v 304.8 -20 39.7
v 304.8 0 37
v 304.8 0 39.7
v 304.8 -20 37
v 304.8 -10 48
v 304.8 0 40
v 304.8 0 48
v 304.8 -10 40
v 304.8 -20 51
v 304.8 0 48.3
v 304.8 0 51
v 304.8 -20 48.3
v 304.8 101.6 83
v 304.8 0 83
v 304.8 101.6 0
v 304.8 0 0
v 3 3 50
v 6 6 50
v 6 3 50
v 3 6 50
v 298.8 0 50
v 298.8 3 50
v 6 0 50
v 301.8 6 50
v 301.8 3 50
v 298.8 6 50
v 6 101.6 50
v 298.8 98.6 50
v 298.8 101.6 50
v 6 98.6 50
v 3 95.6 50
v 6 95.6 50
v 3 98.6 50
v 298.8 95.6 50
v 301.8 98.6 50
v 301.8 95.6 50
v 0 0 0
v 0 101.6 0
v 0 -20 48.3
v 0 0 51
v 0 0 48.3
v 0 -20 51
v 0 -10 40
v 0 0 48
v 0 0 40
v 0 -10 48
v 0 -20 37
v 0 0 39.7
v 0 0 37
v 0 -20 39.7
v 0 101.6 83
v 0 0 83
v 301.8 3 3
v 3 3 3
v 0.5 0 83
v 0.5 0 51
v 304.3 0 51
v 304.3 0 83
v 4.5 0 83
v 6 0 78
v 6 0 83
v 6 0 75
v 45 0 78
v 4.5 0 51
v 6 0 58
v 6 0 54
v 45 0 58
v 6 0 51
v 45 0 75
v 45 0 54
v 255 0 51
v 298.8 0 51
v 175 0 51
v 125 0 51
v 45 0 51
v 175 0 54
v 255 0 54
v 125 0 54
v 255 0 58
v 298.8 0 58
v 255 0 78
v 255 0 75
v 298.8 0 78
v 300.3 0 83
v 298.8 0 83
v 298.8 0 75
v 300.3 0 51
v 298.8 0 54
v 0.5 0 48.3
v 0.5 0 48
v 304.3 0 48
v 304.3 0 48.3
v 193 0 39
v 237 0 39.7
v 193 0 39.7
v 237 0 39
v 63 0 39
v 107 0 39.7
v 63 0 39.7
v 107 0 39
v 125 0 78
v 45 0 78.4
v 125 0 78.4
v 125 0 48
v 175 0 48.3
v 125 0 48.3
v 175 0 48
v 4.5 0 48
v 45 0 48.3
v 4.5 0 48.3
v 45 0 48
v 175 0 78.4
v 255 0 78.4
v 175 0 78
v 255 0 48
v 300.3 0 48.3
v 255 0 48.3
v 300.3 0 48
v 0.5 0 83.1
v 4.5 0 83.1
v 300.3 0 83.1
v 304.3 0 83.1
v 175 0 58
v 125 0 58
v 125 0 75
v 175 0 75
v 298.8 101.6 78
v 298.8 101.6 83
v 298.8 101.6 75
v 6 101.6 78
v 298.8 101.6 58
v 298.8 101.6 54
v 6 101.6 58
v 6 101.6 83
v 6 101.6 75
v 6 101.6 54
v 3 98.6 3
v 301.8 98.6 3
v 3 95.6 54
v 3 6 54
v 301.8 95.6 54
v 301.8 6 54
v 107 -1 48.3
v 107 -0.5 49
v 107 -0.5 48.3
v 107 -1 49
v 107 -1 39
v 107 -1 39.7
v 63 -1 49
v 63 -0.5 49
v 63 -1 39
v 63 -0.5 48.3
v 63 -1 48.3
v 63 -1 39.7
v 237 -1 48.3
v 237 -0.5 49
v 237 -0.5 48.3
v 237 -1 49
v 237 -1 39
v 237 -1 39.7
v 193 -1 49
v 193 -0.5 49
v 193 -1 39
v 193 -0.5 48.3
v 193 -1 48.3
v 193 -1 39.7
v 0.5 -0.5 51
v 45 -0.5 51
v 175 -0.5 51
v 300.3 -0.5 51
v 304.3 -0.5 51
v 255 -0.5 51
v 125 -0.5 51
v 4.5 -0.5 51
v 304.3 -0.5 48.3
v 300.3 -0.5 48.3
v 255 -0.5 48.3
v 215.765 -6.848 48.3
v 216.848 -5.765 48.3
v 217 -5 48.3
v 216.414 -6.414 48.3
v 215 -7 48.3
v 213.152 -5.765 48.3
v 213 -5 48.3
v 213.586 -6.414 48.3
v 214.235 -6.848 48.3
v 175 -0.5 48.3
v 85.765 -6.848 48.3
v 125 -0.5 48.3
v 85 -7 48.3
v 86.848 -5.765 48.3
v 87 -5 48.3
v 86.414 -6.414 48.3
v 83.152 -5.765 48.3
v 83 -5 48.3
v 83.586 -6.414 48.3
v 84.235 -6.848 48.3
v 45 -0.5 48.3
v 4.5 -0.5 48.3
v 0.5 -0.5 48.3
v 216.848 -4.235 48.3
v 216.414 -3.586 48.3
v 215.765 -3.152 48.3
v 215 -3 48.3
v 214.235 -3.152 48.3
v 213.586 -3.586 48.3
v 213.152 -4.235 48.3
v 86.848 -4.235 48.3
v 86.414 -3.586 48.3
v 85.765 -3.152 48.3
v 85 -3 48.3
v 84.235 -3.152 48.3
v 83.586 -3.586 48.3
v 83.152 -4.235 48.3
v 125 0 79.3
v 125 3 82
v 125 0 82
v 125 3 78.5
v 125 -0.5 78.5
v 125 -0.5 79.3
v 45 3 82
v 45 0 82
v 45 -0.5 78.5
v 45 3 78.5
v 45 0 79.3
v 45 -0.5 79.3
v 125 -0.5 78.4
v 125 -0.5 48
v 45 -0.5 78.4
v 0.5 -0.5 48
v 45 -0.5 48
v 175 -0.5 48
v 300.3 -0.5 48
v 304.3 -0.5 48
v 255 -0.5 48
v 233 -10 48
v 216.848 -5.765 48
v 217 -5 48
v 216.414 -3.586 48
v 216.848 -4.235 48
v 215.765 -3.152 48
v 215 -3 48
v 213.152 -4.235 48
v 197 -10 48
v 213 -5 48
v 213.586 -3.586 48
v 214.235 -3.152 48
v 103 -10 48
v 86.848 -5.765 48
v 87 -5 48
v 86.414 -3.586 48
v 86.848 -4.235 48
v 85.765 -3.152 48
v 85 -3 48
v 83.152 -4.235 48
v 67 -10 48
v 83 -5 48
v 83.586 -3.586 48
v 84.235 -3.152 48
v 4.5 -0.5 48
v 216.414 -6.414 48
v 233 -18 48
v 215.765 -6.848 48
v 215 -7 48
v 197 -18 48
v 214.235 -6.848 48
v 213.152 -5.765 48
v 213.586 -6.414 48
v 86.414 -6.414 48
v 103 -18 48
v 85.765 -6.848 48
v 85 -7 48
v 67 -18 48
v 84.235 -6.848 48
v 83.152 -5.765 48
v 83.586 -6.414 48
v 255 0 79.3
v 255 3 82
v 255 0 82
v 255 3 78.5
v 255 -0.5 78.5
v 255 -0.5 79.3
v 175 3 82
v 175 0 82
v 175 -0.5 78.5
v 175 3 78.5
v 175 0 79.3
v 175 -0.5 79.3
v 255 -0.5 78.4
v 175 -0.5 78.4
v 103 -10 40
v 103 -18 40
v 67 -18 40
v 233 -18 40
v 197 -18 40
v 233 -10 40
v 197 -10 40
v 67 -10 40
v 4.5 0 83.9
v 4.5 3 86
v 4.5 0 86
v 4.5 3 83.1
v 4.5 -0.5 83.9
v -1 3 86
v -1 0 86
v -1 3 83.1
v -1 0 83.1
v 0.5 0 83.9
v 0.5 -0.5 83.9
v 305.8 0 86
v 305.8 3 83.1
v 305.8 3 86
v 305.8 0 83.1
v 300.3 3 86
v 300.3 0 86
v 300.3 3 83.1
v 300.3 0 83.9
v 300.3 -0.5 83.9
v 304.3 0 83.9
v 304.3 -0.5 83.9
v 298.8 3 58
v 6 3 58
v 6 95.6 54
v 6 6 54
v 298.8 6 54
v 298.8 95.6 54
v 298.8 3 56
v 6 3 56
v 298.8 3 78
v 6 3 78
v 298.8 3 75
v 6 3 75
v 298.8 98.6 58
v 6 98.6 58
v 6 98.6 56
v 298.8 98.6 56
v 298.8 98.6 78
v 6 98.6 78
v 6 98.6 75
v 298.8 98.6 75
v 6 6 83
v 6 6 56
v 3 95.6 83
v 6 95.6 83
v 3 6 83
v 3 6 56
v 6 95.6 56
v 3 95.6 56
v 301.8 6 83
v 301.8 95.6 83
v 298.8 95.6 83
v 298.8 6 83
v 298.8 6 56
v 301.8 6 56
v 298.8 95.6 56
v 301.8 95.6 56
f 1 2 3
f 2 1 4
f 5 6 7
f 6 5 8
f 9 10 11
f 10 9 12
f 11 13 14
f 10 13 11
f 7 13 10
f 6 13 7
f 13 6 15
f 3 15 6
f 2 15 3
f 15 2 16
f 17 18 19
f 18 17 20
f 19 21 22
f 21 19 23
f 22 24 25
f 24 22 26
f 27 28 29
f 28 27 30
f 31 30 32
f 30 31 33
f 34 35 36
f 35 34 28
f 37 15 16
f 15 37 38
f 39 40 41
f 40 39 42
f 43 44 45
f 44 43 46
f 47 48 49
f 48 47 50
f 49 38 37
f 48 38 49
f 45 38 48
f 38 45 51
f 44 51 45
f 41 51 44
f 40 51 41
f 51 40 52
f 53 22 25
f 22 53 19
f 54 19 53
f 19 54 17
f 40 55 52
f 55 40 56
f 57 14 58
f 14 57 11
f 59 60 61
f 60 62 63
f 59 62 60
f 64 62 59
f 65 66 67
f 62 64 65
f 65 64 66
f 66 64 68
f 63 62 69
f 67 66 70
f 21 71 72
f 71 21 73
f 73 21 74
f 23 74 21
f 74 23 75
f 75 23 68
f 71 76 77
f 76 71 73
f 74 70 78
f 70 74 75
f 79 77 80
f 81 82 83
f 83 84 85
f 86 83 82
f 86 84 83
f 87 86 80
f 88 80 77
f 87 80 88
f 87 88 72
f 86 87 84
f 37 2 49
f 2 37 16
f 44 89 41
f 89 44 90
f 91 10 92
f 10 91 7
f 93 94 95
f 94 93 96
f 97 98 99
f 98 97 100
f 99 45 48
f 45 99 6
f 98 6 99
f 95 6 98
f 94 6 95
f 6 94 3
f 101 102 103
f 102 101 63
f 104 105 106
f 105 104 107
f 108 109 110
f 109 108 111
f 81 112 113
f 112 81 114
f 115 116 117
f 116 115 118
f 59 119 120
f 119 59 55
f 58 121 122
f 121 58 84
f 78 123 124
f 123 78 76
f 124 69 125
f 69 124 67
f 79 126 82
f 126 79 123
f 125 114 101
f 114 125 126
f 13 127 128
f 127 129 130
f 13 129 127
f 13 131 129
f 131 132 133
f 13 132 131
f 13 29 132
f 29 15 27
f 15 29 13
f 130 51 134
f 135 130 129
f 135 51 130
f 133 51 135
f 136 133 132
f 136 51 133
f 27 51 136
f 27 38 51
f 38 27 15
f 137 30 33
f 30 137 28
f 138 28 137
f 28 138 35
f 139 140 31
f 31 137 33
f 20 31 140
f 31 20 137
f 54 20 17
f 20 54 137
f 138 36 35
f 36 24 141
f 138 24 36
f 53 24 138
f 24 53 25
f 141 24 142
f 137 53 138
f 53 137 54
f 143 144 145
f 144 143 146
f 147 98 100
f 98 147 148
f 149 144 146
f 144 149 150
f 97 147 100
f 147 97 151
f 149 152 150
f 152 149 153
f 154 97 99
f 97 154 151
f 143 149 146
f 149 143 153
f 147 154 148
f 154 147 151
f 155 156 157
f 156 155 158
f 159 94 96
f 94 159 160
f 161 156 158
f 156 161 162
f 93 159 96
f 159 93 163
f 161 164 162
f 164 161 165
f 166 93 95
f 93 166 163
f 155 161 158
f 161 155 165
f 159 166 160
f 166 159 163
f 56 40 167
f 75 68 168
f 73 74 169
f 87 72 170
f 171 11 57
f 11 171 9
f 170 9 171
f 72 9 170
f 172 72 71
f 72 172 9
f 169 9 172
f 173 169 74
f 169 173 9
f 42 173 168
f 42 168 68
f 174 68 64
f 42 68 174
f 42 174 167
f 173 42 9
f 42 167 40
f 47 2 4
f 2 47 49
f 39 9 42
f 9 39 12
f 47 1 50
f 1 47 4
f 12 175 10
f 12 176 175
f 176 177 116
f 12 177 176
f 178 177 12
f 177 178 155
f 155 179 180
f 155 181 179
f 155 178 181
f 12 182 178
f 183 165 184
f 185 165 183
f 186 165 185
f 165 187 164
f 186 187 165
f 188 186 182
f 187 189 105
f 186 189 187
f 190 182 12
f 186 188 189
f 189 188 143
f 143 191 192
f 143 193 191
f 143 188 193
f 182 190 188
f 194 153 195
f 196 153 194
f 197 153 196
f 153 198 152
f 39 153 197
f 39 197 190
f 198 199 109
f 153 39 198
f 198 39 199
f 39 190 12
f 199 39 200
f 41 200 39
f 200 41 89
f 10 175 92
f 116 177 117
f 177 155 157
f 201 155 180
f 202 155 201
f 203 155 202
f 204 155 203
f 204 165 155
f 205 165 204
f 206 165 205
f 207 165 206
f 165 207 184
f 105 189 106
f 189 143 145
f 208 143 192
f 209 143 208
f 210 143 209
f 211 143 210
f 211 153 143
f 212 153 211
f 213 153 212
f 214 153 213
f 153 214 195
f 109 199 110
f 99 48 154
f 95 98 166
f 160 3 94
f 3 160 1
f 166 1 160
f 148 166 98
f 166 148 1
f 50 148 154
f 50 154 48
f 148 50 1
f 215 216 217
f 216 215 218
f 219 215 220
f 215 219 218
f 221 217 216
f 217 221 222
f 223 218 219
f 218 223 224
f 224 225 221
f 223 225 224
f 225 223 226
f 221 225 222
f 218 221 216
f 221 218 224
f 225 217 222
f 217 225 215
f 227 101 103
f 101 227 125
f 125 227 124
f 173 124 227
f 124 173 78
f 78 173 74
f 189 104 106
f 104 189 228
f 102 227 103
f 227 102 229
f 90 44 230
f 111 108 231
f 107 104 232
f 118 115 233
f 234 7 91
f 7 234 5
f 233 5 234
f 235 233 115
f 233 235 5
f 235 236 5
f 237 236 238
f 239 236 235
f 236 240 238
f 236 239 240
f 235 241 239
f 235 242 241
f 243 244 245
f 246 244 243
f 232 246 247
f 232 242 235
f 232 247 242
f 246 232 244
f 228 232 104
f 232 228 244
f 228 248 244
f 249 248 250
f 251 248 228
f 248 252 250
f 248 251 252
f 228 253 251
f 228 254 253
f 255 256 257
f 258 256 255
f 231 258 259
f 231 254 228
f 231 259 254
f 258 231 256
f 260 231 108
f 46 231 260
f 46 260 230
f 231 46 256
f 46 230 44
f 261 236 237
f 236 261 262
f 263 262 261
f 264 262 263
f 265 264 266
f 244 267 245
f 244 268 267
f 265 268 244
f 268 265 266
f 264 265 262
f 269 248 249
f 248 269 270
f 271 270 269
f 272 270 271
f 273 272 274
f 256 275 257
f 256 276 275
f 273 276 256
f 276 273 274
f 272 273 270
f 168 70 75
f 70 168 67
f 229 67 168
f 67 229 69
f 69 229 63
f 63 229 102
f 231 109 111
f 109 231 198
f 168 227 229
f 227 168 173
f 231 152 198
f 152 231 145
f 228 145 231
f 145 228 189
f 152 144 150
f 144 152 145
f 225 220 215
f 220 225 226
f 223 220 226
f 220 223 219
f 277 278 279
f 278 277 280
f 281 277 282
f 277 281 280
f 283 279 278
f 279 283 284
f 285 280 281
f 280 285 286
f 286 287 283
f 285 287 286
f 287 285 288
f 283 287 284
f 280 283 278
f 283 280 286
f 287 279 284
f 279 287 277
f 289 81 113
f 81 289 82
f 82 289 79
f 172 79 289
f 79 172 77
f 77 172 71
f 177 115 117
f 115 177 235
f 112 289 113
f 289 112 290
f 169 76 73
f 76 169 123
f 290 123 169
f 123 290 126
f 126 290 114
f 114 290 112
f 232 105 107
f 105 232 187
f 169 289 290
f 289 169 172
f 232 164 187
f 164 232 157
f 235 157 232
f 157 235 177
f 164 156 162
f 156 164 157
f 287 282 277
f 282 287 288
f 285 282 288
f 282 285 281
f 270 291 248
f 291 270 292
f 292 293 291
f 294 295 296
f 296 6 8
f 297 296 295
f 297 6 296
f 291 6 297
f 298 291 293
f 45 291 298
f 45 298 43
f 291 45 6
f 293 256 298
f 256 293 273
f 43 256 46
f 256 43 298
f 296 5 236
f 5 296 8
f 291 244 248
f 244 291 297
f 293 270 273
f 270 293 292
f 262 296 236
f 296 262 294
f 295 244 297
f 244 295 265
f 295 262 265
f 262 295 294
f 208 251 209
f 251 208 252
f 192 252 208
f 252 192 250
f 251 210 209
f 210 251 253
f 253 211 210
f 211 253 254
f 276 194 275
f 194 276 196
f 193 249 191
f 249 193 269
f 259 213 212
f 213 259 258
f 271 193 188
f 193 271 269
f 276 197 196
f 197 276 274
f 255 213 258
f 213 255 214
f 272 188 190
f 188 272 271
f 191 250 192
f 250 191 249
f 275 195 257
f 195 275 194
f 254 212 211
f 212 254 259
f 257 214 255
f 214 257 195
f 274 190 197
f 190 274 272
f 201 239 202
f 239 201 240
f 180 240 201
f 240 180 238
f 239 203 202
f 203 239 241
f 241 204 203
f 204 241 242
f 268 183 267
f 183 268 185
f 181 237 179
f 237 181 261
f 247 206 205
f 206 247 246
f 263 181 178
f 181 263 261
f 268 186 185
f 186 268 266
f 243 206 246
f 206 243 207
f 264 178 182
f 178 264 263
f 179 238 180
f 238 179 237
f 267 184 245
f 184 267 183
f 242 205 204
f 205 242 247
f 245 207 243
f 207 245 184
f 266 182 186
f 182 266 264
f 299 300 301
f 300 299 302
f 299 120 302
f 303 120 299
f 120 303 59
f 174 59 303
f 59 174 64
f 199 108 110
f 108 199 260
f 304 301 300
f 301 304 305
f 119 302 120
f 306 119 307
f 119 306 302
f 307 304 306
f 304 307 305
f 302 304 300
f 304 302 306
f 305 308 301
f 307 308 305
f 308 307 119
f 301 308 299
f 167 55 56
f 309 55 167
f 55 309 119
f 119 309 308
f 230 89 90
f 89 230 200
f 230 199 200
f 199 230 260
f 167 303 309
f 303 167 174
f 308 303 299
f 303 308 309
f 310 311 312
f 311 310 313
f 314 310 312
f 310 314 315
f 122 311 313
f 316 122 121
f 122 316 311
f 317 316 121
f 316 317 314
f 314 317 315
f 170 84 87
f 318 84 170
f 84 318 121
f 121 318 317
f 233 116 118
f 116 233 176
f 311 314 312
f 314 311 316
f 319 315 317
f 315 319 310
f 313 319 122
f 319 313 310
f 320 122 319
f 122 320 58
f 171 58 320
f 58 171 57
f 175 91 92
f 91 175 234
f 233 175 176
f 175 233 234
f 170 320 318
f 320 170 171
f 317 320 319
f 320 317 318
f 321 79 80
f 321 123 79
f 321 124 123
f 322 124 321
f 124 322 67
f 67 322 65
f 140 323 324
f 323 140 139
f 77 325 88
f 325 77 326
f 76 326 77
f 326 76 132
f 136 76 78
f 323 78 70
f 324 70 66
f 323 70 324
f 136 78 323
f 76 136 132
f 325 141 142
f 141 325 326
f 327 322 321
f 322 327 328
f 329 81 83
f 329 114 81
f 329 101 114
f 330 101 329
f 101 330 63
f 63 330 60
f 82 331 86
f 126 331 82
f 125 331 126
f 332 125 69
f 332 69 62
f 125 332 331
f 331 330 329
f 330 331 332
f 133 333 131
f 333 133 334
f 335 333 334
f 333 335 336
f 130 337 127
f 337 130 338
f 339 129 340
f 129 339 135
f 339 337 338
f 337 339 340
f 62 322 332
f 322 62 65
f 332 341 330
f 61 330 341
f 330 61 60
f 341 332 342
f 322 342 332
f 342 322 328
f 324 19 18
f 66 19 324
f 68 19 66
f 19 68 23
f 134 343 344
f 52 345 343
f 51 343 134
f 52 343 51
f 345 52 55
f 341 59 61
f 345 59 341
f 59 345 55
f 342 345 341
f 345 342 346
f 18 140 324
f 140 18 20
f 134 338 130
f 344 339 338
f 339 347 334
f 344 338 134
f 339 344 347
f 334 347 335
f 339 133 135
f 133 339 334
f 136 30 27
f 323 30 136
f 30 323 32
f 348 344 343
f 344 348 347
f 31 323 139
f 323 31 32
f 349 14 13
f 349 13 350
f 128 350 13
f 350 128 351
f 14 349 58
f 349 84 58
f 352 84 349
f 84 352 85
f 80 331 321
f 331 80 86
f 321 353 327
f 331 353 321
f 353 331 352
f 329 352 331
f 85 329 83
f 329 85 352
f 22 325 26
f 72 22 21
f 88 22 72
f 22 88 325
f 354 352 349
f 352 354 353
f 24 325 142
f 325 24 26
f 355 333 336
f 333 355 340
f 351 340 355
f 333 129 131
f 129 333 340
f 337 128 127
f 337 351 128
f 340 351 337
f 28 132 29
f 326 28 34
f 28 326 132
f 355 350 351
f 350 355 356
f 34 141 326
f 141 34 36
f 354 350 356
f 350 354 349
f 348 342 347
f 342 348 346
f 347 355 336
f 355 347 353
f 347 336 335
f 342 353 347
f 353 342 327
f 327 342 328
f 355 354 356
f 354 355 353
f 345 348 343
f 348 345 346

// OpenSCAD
// file: ../top_ref.scad
// top_ref.scad  — FAITHFUL reference of the real uploaded top tray (L3.stl)
// Extracted from L3.stl by voxel analysis. Coordinates: new-tray top face = z=0 here,
// call top_ref(base=50) to seat it on a 50mm-tall new tray.
// DO NOT MODIFY THIS PART IN ANY DESIGN — it represents an already-printed tray.
//
// Real dims: 304.8 (X) x 101.6 (Y) x 33 (Z).
//  - END walls (short, x=0..3 and 301.8..304.8): SOLID full height -> top at z=33 (seated 83)
//  - LONG sides (front y=0..3, back y=98.6..101.6): OPEN FRAME
//        bottom rail z=4..8, top rail z=25..28, OPEN between (z=9..24)
//        side top edge at z=28 (seated 78)
//  - Corners: full height to z=33 (seated 83)
//  - Floor plate: z=4..6
// Seated mapping (base=50): add 50 to every z below.

TR_X = 304.8;
TR_Y = 101.6;
TR_Z = 33;
TR_wall = 3;        // side/end wall thickness
TR_endw = 3;        // short-end wall thickness
TR_botrail_z0 = 4;  TR_botrail_z1 = 8;     // long-side bottom rail
TR_toprail_z0 = 25; TR_toprail_z1 = 28;    // long-side top rail (side top edge=28)
TR_floor_z0 = 4;    TR_floor_z1 = 6;
TR_corner = 6;      // corner post footprint (x & y) kept full height

module top_ref(base=50, col="#90A4AE", alpha=1.0) {
    color(col, alpha)
    translate([0,0,base])
    union() {
        // ---- floor plate ----
        translate([TR_endw, TR_wall, TR_floor_z0])
            cube([TR_X-2*TR_endw, TR_Y-2*TR_wall, TR_floor_z1-TR_floor_z0]);
        // ---- two short END walls: full height ----
        cube([TR_endw, TR_Y, TR_Z]);
        translate([TR_X-TR_endw,0,0]) cube([TR_endw, TR_Y, TR_Z]);
        // ---- long-side OPEN FRAMES (front & back) ----
        for (yy=[0, TR_Y-TR_wall]) {
            // bottom rail
            translate([0, yy, TR_botrail_z0]) cube([TR_X, TR_wall, TR_botrail_z1-TR_botrail_z0]);
            // top rail (side top edge)
            translate([0, yy, TR_toprail_z0]) cube([TR_X, TR_wall, TR_toprail_z1-TR_toprail_z0]);
        }
        // ---- corner posts full height (tie frames together, reach z=33) ----
        for (xx=[0, TR_X-TR_corner], yy=[0, TR_Y-TR_corner])
            translate([xx,yy,0]) cube([TR_corner, TR_corner, TR_Z]);
    }
}

// Convenience constants a design can reference (seated, base=50):
//   END-wall top edge:        z = 50+33 = 83  (over the short ends -> strong clamp)
//   Long-side top rail top:   z = 50+28 = 78  (hook over / under along front)
//   Long-side open slot:      z = 50+9 .. 50+24 = 59..74 (reach a tongue in anywhere)
//   Corner top:               z = 83
// main file
// 04_twintab.scad — Twin-Tab Heavy-Duty Slide-Bolt
// Two wide capture tabs (front + end clamps) driven by one push-bar.
// Tabs are 80mm wide each, giving large surface contact.
// Also includes end-wall capture (same as 02_endclamp) for a 3-point lock.
// Unlocked: all hardware at y<0 or x<0 / x>T_X.
// Locking operation: push bar +Y (8mm travel).

show  = "all";  // [all, new, top]
lock  = 1;      // 0=unlocked  1=locked

include <../top_ref.scad>

T_X = 304.8;  T_Y = 101.6;  T_Z = 50;  T_W = 3;

BAR_TRAVEL = 10;   // slightly more travel for positive feel
BAR_D      = 10;
BAR_H      = 8;
BAR_Z0     = T_Z - BAR_H - 2;  // z=40

bar_front  = lock ? 0.0 : -BAR_TRAVEL;
bar_rear   = bar_front - BAR_D;

// Two large front caps
CAP_Z0  = 78.5;
CAP_Z1  = 82.0;    // 3.5mm tall for more material
CAP_TH  = T_W;
CAP_W   = 80;
CAP_CX  = [85, 215];   // two large tabs, symmetric

ARM_Y   = bar_front - 0.5;
ARM_TH  = 0.5;
ARM_Z0  = BAR_Z0 + BAR_H;
ARM_Z1  = 78.4;

// End clamps (same as 02)
EC_LIP_Z0 = 83.1;
EC_LIP_Z1 = 86.0;
EC_LIP_Y  = T_W;

// Housing
HSG_Z0   = BAR_Z0 - 3;
HSG_H    = BAR_H + 6;

module new_tray() {
    color("#1565C0") {
        cube([T_X, T_W, T_Z]);
        translate([0, T_Y-T_W, 0]) cube([T_X, T_W, T_Z]);
        cube([T_W, T_Y, T_Z]);
        translate([T_X-T_W, 0, 0]) cube([T_W, T_Y, T_Z]);
        cube([T_X, T_Y, T_W]);
    }
}

module housing_fixed() {
    color("#F9A825")
    difference() {
        translate([0, -(BAR_D + BAR_TRAVEL), HSG_Z0])
            cube([T_X, BAR_D + BAR_TRAVEL, HSG_H]);
        // Bar channel
        translate([-1, -(BAR_D + BAR_TRAVEL) - 0.3, BAR_Z0 - 0.3])
            cube([T_X+2, BAR_D + BAR_TRAVEL + 0.6, BAR_H + 0.6]);
        // Two finger openings
        for (cx = CAP_CX) {
            translate([cx - 22, -1, BAR_Z0 - 1])
                cube([44, 6, BAR_H + 2]);
        }
    }
}

module sliding_bar() {
    color("#C62828") {
        // Bar body
        translate([0, bar_rear, BAR_Z0])
            cube([T_X, BAR_D, BAR_H]);

        // Two large front caps
        for (cx = CAP_CX) {
            tx0 = max(cx - CAP_W/2, 7.0);
            tx1 = min(cx + CAP_W/2, 297.8);
            tw  = tx1 - tx0;
            if (tw > 5) {
                translate([tx0, bar_front, CAP_Z0])
                    cube([tw, CAP_TH, CAP_Z1 - CAP_Z0]);
                translate([tx0, ARM_Y, ARM_Z0])
                    cube([tw, ARM_TH, ARM_Z1 - ARM_Z0]);
                translate([tx0, ARM_Y, CAP_Z0])
                    cube([tw, bar_front - ARM_Y + CAP_TH, 0.8]);
            }
        }

        // End clamps (straddle left and right end walls, above z=83)
        // Left end wall x=0..3
        translate([-1.0, bar_front, EC_LIP_Z0])
            cube([5.5, EC_LIP_Y, EC_LIP_Z1 - EC_LIP_Z0]);
        translate([0.5, ARM_Y, ARM_Z0])
            cube([4.0, ARM_TH, EC_LIP_Z0 - ARM_Z0]);
        translate([0.5, ARM_Y, EC_LIP_Z0])
            cube([4.0, bar_front - ARM_Y + EC_LIP_Y, 0.8]);

        // Right end wall x=301.8..304.8
        translate([T_X - 4.5, bar_front, EC_LIP_Z0])
            cube([5.5, EC_LIP_Y, EC_LIP_Z1 - EC_LIP_Z0]);
        translate([T_X - 4.5, ARM_Y, ARM_Z0])
            cube([4.0, ARM_TH, EC_LIP_Z0 - ARM_Z0]);
        translate([T_X - 4.5, ARM_Y, EC_LIP_Z0])
            cube([4.0, bar_front - ARM_Y + EC_LIP_Y, 0.8]);

        // Large finger tabs with ergonomic shape
        for (cx = CAP_CX) {
            translate([cx - 18, bar_rear - 8, BAR_Z0])
                cube([36, 8, BAR_H]);
        }

        // Detent nubs (strong, 2 positions)
        for (cx = CAP_CX) {
            translate([cx, bar_rear + BAR_D/2, BAR_Z0 + BAR_H])
                cylinder(r=2.0, h=1.2, $fn=16);
        }
    }
}

module new_assembly(lk) {
    new_tray();
    housing_fixed();
    sliding_bar();
}

if (show != "top") new_assembly(lock);
if (show != "new") top_ref(50);
